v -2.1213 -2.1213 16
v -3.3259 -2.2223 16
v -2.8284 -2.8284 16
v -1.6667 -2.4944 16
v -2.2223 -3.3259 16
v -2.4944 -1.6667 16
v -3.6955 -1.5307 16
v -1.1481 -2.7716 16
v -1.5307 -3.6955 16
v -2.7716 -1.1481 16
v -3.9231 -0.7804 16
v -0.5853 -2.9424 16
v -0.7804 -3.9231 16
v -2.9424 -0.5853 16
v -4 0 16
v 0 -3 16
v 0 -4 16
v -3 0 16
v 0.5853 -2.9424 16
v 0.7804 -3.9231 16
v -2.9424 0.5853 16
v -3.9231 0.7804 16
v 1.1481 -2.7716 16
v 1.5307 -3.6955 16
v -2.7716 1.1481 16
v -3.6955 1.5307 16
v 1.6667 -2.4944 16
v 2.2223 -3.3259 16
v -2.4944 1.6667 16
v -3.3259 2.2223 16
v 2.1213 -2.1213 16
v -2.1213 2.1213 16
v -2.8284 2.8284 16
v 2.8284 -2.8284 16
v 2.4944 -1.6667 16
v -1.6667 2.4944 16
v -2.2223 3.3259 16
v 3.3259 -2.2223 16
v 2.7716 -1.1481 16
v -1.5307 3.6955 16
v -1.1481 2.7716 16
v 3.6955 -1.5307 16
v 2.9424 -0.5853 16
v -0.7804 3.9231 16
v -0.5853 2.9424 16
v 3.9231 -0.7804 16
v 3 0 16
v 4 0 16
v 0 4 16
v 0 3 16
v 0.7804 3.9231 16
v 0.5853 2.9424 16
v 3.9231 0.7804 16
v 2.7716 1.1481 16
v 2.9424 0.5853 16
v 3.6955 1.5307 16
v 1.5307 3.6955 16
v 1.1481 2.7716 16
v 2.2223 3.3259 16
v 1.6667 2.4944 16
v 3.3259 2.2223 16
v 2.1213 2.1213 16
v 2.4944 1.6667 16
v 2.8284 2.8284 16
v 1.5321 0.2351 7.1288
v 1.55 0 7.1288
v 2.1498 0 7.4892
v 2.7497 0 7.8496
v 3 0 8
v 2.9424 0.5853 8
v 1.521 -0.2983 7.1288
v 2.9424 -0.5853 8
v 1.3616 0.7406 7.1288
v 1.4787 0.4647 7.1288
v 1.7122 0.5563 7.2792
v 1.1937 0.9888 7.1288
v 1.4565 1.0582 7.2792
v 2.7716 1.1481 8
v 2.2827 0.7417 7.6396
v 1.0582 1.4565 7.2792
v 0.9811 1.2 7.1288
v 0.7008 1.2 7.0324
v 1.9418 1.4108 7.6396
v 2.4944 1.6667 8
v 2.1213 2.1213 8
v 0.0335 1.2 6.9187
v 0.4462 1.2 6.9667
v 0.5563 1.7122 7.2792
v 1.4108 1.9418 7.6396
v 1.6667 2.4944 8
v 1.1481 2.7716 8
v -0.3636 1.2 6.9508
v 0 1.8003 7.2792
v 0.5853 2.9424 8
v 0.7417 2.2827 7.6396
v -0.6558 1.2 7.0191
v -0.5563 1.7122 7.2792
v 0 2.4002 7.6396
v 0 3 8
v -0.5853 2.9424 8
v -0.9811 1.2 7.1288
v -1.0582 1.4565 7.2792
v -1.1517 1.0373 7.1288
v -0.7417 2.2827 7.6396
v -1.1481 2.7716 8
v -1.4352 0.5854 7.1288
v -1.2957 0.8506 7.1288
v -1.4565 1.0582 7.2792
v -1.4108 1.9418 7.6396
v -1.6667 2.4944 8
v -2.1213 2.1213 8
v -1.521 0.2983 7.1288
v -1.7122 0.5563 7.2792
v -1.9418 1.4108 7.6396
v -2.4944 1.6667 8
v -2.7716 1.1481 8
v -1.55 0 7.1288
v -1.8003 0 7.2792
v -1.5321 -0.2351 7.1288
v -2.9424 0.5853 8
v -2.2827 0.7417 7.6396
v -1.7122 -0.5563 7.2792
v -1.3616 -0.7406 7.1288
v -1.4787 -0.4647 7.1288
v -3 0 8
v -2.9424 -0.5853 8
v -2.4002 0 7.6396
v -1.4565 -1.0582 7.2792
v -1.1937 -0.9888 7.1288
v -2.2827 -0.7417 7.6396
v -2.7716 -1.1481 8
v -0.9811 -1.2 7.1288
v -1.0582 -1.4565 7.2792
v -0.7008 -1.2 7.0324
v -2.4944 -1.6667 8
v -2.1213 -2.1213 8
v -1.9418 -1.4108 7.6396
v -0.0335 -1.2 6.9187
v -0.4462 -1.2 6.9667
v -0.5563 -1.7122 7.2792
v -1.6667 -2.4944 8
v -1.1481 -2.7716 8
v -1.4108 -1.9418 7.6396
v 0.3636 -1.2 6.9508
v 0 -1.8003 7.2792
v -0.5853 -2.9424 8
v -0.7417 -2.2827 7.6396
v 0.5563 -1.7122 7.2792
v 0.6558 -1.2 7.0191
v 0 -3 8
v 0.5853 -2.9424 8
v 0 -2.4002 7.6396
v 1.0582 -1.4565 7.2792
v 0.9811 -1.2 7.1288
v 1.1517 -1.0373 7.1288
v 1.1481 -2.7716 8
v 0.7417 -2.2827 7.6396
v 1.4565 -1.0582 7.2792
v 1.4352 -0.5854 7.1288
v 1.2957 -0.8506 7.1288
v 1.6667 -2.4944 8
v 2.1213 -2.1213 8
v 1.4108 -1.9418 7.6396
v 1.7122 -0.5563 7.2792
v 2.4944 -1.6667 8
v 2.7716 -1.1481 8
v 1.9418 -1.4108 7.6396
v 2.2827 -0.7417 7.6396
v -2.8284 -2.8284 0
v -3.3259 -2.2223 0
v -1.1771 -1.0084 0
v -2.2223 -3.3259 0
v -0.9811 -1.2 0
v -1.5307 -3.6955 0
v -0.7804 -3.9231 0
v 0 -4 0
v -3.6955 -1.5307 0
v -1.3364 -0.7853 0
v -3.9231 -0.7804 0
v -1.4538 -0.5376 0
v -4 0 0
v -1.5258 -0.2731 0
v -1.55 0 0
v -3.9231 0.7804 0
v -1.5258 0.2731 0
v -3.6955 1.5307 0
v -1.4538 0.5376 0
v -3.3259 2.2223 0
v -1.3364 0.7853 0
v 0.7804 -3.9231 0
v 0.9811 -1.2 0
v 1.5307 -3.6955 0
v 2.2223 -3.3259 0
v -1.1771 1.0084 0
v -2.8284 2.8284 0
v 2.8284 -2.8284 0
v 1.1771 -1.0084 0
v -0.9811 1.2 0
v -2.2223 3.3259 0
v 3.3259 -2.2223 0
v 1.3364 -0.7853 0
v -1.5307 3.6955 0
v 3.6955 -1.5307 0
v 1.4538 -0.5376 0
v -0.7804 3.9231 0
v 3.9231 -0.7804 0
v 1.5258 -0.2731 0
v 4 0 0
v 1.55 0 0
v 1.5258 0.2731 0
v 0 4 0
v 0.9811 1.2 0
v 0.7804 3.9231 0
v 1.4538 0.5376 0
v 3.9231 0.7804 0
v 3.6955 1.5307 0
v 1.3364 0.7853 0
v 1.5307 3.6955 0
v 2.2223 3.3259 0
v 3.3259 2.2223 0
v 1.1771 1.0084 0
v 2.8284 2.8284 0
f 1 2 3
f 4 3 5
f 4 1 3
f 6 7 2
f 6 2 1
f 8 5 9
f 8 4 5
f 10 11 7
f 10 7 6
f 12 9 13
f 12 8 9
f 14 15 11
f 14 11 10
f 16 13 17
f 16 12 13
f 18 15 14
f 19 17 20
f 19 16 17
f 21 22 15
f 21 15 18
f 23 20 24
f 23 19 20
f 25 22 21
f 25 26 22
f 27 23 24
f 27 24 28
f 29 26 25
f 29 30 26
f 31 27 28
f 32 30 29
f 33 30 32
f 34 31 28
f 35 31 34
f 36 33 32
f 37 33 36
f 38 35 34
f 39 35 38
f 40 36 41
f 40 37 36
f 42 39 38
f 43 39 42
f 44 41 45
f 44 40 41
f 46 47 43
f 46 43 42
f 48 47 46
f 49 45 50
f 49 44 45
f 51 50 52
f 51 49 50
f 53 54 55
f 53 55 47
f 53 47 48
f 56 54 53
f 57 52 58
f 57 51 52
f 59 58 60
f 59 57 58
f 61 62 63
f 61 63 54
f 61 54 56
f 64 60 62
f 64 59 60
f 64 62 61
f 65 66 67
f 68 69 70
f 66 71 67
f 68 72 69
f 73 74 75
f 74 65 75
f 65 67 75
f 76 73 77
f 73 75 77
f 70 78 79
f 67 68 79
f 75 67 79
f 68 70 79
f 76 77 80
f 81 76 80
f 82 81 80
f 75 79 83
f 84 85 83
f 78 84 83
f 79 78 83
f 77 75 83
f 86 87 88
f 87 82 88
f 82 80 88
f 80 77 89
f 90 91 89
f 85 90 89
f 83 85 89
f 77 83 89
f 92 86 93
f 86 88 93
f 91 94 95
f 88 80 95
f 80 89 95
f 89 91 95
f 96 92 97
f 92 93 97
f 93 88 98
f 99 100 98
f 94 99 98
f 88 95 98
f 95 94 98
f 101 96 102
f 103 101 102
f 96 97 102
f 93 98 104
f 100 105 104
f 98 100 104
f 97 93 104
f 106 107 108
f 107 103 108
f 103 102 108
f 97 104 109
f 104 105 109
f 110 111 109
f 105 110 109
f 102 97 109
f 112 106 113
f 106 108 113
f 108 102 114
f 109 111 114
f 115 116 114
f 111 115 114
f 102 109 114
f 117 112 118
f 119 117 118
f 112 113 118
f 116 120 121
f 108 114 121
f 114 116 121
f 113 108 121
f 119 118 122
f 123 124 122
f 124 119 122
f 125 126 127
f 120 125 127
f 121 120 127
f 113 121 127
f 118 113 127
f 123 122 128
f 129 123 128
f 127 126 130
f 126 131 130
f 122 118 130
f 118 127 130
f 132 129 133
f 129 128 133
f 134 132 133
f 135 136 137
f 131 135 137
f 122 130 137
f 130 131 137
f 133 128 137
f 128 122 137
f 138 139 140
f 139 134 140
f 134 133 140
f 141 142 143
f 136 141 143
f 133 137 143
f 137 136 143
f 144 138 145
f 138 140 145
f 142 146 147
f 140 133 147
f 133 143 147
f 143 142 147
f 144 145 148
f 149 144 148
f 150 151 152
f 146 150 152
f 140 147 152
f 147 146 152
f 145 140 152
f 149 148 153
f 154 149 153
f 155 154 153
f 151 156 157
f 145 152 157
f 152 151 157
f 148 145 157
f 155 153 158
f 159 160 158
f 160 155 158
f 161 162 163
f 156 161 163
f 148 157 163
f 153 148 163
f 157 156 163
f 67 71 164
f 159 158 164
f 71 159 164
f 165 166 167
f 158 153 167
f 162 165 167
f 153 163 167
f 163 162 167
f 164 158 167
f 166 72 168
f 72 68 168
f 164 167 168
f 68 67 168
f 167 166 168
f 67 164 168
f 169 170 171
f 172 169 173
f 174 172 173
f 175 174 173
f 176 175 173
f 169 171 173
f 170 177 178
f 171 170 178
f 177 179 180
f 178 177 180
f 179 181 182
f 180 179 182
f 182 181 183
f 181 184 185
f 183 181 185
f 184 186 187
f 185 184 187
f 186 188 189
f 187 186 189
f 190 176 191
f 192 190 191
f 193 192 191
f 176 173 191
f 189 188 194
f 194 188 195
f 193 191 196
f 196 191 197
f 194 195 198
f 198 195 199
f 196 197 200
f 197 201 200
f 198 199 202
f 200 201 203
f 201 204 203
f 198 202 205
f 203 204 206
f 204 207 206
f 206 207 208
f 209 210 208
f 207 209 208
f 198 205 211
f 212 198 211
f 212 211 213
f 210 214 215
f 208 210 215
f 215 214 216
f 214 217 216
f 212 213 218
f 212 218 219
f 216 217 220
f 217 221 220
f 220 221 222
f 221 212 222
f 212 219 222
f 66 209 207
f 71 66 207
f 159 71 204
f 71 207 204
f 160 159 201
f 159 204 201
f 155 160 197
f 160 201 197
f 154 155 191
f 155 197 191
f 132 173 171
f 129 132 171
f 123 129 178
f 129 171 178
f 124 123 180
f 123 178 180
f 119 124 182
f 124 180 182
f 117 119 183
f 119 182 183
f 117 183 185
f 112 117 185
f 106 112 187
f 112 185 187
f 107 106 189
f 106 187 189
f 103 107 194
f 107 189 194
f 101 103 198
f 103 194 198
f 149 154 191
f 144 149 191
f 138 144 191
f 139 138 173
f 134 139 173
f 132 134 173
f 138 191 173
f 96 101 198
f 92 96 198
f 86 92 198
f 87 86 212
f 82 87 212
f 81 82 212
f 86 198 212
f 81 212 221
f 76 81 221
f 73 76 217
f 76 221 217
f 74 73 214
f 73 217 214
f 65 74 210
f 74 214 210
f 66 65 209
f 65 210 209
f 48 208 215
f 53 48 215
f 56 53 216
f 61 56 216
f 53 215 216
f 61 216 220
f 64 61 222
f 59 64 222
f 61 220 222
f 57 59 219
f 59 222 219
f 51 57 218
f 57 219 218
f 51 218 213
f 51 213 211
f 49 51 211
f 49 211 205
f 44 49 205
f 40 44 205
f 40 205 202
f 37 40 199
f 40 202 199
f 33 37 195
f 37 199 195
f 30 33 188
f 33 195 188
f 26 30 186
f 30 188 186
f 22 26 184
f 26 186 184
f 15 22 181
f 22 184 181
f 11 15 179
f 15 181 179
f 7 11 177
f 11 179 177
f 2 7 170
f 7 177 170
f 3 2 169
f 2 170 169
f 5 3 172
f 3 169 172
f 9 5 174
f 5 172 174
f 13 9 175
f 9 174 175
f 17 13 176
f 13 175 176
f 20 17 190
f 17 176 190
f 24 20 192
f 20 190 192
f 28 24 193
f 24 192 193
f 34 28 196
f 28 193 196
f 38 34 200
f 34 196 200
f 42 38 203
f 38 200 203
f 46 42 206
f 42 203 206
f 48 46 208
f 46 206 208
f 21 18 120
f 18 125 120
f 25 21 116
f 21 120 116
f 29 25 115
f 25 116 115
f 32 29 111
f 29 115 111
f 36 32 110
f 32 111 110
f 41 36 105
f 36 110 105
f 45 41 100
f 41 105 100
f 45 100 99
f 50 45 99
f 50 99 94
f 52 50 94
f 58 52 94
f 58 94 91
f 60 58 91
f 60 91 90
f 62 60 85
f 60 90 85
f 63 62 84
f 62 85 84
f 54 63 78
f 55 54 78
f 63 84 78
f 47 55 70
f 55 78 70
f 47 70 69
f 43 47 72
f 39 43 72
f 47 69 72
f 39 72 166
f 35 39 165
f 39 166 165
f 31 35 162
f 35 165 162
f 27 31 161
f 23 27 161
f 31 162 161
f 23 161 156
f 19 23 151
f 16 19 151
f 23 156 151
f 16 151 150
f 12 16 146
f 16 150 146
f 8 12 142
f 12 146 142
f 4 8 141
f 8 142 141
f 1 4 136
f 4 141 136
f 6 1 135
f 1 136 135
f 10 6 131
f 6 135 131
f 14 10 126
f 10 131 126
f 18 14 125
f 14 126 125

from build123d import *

# Parameters (mm, degrees)
F0_R     = 4
F1_DEPTH = 16
F3_D     = 6
F3_DEPTH = 8
F3_TIP   = 1.8025818571


with BuildPart() as f1:
    # F0 (on Top) → F1 (new body)
    with BuildSketch(Plane.XY):
        Circle(F0_R)
        with BuildLine():
            ThreePointArc((-1.55, 0), (-1.4005641377, 0.6640181445), (-0.9810708435, 1.2))
            Line((-0.9810708435, 1.2), (0.9810708435, 1.2))
            ThreePointArc((0.9810708435, 1.2), (1.4005641377, 0.6640181445), (1.55, 0))
            ThreePointArc((1.55, 0), (1.4005641377, -0.6640181445), (0.9810708435, -1.2))
            Line((0.9810708435, -1.2), (-0.9810708435, -1.2))
            ThreePointArc((-0.9810708435, -1.2), (-1.4005641377, -0.6640181445), (-1.55, 0))
        make_face(mode=Mode.SUBTRACT)
    extrude(amount=F1_DEPTH)

    # F3
    with Locations(Plane.XY.offset(16)):
        with Locations((0, 0)):
            Hole(F3_D / 2, depth=F3_DEPTH)
            with Locations((0, 0, -(F3_DEPTH + F3_TIP / 2))):  # 118° drill point
                Cone(0, F3_D / 2, F3_TIP, mode=Mode.SUBTRACT)


solid = f1.part
